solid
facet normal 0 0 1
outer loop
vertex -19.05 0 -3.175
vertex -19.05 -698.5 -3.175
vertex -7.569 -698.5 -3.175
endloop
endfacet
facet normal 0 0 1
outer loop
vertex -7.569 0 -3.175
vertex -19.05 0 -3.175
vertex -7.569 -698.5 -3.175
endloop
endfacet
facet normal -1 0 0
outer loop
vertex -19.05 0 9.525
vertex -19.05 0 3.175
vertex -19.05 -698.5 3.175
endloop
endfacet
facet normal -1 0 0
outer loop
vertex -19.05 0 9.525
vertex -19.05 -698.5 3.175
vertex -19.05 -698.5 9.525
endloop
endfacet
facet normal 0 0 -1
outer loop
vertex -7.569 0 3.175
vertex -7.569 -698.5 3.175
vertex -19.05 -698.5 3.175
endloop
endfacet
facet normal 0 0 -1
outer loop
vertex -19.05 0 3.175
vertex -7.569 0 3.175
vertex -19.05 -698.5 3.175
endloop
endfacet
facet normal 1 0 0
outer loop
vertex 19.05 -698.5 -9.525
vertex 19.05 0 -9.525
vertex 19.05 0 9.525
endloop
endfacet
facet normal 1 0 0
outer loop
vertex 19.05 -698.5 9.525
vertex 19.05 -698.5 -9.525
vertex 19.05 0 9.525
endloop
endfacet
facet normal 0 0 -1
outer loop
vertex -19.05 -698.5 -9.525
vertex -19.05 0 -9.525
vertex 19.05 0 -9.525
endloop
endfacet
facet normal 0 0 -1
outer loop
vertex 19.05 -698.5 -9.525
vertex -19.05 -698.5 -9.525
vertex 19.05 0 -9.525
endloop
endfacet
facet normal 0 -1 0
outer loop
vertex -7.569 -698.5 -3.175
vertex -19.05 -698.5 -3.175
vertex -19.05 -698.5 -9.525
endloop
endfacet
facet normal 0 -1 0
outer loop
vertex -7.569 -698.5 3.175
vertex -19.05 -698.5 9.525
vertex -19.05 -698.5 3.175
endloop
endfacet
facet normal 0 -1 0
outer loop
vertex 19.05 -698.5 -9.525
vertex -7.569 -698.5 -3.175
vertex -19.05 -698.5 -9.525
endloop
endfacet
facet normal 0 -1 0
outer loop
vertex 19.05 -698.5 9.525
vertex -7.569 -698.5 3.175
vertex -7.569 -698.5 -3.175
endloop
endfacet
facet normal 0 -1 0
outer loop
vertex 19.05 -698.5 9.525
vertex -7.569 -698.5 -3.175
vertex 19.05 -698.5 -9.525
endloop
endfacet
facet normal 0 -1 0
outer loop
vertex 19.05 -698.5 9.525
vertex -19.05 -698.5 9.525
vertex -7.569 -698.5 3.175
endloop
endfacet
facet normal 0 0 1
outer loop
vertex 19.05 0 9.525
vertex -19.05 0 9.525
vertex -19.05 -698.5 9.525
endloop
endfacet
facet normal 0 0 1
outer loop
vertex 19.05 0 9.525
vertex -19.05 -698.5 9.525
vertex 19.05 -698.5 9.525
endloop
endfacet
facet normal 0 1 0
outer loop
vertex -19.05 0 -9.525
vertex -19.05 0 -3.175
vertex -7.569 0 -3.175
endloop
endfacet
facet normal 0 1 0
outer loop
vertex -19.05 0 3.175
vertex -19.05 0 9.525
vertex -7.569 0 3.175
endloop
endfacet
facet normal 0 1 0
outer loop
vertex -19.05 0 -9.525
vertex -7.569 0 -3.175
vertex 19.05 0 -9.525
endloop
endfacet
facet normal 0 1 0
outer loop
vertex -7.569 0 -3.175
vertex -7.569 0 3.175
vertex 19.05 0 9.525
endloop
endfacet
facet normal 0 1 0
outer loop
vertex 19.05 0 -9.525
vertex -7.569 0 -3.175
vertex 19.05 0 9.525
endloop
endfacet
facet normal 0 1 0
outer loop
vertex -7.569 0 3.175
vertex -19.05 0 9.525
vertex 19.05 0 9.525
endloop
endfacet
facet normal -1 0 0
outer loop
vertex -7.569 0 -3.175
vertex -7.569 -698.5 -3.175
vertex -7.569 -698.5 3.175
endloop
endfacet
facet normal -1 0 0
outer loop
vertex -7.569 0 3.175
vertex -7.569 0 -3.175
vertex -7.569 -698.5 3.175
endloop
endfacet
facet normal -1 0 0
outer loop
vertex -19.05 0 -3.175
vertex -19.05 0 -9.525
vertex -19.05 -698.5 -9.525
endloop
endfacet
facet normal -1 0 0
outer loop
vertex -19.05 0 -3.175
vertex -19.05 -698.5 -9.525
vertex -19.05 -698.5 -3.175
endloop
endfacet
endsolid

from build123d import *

# Parameters (mm, degrees)
F0_W     = 38.1
F0_H     = 19.05
F1_DEPTH = 698.5
F3_DEPTH = 698.501


with BuildPart() as f1:
    # F0 (on Front) → F1 (new body)
    with BuildSketch(Plane.XZ):
        Rectangle(F0_W, F0_H)
    extrude(amount=F1_DEPTH)

    # F2 (on face) → F3 (cut, through all)
    with BuildSketch(Plane.XZ.offset(698.5)):
        Polygon((-19.05, 0), (-19.05, -3.175), (-7.569117, -3.175), (-7.569117, 3.175), (-19.05, 3.175), align=None)
    extrude(amount=-F3_DEPTH, mode=Mode.SUBTRACT)


solid = f1.part
